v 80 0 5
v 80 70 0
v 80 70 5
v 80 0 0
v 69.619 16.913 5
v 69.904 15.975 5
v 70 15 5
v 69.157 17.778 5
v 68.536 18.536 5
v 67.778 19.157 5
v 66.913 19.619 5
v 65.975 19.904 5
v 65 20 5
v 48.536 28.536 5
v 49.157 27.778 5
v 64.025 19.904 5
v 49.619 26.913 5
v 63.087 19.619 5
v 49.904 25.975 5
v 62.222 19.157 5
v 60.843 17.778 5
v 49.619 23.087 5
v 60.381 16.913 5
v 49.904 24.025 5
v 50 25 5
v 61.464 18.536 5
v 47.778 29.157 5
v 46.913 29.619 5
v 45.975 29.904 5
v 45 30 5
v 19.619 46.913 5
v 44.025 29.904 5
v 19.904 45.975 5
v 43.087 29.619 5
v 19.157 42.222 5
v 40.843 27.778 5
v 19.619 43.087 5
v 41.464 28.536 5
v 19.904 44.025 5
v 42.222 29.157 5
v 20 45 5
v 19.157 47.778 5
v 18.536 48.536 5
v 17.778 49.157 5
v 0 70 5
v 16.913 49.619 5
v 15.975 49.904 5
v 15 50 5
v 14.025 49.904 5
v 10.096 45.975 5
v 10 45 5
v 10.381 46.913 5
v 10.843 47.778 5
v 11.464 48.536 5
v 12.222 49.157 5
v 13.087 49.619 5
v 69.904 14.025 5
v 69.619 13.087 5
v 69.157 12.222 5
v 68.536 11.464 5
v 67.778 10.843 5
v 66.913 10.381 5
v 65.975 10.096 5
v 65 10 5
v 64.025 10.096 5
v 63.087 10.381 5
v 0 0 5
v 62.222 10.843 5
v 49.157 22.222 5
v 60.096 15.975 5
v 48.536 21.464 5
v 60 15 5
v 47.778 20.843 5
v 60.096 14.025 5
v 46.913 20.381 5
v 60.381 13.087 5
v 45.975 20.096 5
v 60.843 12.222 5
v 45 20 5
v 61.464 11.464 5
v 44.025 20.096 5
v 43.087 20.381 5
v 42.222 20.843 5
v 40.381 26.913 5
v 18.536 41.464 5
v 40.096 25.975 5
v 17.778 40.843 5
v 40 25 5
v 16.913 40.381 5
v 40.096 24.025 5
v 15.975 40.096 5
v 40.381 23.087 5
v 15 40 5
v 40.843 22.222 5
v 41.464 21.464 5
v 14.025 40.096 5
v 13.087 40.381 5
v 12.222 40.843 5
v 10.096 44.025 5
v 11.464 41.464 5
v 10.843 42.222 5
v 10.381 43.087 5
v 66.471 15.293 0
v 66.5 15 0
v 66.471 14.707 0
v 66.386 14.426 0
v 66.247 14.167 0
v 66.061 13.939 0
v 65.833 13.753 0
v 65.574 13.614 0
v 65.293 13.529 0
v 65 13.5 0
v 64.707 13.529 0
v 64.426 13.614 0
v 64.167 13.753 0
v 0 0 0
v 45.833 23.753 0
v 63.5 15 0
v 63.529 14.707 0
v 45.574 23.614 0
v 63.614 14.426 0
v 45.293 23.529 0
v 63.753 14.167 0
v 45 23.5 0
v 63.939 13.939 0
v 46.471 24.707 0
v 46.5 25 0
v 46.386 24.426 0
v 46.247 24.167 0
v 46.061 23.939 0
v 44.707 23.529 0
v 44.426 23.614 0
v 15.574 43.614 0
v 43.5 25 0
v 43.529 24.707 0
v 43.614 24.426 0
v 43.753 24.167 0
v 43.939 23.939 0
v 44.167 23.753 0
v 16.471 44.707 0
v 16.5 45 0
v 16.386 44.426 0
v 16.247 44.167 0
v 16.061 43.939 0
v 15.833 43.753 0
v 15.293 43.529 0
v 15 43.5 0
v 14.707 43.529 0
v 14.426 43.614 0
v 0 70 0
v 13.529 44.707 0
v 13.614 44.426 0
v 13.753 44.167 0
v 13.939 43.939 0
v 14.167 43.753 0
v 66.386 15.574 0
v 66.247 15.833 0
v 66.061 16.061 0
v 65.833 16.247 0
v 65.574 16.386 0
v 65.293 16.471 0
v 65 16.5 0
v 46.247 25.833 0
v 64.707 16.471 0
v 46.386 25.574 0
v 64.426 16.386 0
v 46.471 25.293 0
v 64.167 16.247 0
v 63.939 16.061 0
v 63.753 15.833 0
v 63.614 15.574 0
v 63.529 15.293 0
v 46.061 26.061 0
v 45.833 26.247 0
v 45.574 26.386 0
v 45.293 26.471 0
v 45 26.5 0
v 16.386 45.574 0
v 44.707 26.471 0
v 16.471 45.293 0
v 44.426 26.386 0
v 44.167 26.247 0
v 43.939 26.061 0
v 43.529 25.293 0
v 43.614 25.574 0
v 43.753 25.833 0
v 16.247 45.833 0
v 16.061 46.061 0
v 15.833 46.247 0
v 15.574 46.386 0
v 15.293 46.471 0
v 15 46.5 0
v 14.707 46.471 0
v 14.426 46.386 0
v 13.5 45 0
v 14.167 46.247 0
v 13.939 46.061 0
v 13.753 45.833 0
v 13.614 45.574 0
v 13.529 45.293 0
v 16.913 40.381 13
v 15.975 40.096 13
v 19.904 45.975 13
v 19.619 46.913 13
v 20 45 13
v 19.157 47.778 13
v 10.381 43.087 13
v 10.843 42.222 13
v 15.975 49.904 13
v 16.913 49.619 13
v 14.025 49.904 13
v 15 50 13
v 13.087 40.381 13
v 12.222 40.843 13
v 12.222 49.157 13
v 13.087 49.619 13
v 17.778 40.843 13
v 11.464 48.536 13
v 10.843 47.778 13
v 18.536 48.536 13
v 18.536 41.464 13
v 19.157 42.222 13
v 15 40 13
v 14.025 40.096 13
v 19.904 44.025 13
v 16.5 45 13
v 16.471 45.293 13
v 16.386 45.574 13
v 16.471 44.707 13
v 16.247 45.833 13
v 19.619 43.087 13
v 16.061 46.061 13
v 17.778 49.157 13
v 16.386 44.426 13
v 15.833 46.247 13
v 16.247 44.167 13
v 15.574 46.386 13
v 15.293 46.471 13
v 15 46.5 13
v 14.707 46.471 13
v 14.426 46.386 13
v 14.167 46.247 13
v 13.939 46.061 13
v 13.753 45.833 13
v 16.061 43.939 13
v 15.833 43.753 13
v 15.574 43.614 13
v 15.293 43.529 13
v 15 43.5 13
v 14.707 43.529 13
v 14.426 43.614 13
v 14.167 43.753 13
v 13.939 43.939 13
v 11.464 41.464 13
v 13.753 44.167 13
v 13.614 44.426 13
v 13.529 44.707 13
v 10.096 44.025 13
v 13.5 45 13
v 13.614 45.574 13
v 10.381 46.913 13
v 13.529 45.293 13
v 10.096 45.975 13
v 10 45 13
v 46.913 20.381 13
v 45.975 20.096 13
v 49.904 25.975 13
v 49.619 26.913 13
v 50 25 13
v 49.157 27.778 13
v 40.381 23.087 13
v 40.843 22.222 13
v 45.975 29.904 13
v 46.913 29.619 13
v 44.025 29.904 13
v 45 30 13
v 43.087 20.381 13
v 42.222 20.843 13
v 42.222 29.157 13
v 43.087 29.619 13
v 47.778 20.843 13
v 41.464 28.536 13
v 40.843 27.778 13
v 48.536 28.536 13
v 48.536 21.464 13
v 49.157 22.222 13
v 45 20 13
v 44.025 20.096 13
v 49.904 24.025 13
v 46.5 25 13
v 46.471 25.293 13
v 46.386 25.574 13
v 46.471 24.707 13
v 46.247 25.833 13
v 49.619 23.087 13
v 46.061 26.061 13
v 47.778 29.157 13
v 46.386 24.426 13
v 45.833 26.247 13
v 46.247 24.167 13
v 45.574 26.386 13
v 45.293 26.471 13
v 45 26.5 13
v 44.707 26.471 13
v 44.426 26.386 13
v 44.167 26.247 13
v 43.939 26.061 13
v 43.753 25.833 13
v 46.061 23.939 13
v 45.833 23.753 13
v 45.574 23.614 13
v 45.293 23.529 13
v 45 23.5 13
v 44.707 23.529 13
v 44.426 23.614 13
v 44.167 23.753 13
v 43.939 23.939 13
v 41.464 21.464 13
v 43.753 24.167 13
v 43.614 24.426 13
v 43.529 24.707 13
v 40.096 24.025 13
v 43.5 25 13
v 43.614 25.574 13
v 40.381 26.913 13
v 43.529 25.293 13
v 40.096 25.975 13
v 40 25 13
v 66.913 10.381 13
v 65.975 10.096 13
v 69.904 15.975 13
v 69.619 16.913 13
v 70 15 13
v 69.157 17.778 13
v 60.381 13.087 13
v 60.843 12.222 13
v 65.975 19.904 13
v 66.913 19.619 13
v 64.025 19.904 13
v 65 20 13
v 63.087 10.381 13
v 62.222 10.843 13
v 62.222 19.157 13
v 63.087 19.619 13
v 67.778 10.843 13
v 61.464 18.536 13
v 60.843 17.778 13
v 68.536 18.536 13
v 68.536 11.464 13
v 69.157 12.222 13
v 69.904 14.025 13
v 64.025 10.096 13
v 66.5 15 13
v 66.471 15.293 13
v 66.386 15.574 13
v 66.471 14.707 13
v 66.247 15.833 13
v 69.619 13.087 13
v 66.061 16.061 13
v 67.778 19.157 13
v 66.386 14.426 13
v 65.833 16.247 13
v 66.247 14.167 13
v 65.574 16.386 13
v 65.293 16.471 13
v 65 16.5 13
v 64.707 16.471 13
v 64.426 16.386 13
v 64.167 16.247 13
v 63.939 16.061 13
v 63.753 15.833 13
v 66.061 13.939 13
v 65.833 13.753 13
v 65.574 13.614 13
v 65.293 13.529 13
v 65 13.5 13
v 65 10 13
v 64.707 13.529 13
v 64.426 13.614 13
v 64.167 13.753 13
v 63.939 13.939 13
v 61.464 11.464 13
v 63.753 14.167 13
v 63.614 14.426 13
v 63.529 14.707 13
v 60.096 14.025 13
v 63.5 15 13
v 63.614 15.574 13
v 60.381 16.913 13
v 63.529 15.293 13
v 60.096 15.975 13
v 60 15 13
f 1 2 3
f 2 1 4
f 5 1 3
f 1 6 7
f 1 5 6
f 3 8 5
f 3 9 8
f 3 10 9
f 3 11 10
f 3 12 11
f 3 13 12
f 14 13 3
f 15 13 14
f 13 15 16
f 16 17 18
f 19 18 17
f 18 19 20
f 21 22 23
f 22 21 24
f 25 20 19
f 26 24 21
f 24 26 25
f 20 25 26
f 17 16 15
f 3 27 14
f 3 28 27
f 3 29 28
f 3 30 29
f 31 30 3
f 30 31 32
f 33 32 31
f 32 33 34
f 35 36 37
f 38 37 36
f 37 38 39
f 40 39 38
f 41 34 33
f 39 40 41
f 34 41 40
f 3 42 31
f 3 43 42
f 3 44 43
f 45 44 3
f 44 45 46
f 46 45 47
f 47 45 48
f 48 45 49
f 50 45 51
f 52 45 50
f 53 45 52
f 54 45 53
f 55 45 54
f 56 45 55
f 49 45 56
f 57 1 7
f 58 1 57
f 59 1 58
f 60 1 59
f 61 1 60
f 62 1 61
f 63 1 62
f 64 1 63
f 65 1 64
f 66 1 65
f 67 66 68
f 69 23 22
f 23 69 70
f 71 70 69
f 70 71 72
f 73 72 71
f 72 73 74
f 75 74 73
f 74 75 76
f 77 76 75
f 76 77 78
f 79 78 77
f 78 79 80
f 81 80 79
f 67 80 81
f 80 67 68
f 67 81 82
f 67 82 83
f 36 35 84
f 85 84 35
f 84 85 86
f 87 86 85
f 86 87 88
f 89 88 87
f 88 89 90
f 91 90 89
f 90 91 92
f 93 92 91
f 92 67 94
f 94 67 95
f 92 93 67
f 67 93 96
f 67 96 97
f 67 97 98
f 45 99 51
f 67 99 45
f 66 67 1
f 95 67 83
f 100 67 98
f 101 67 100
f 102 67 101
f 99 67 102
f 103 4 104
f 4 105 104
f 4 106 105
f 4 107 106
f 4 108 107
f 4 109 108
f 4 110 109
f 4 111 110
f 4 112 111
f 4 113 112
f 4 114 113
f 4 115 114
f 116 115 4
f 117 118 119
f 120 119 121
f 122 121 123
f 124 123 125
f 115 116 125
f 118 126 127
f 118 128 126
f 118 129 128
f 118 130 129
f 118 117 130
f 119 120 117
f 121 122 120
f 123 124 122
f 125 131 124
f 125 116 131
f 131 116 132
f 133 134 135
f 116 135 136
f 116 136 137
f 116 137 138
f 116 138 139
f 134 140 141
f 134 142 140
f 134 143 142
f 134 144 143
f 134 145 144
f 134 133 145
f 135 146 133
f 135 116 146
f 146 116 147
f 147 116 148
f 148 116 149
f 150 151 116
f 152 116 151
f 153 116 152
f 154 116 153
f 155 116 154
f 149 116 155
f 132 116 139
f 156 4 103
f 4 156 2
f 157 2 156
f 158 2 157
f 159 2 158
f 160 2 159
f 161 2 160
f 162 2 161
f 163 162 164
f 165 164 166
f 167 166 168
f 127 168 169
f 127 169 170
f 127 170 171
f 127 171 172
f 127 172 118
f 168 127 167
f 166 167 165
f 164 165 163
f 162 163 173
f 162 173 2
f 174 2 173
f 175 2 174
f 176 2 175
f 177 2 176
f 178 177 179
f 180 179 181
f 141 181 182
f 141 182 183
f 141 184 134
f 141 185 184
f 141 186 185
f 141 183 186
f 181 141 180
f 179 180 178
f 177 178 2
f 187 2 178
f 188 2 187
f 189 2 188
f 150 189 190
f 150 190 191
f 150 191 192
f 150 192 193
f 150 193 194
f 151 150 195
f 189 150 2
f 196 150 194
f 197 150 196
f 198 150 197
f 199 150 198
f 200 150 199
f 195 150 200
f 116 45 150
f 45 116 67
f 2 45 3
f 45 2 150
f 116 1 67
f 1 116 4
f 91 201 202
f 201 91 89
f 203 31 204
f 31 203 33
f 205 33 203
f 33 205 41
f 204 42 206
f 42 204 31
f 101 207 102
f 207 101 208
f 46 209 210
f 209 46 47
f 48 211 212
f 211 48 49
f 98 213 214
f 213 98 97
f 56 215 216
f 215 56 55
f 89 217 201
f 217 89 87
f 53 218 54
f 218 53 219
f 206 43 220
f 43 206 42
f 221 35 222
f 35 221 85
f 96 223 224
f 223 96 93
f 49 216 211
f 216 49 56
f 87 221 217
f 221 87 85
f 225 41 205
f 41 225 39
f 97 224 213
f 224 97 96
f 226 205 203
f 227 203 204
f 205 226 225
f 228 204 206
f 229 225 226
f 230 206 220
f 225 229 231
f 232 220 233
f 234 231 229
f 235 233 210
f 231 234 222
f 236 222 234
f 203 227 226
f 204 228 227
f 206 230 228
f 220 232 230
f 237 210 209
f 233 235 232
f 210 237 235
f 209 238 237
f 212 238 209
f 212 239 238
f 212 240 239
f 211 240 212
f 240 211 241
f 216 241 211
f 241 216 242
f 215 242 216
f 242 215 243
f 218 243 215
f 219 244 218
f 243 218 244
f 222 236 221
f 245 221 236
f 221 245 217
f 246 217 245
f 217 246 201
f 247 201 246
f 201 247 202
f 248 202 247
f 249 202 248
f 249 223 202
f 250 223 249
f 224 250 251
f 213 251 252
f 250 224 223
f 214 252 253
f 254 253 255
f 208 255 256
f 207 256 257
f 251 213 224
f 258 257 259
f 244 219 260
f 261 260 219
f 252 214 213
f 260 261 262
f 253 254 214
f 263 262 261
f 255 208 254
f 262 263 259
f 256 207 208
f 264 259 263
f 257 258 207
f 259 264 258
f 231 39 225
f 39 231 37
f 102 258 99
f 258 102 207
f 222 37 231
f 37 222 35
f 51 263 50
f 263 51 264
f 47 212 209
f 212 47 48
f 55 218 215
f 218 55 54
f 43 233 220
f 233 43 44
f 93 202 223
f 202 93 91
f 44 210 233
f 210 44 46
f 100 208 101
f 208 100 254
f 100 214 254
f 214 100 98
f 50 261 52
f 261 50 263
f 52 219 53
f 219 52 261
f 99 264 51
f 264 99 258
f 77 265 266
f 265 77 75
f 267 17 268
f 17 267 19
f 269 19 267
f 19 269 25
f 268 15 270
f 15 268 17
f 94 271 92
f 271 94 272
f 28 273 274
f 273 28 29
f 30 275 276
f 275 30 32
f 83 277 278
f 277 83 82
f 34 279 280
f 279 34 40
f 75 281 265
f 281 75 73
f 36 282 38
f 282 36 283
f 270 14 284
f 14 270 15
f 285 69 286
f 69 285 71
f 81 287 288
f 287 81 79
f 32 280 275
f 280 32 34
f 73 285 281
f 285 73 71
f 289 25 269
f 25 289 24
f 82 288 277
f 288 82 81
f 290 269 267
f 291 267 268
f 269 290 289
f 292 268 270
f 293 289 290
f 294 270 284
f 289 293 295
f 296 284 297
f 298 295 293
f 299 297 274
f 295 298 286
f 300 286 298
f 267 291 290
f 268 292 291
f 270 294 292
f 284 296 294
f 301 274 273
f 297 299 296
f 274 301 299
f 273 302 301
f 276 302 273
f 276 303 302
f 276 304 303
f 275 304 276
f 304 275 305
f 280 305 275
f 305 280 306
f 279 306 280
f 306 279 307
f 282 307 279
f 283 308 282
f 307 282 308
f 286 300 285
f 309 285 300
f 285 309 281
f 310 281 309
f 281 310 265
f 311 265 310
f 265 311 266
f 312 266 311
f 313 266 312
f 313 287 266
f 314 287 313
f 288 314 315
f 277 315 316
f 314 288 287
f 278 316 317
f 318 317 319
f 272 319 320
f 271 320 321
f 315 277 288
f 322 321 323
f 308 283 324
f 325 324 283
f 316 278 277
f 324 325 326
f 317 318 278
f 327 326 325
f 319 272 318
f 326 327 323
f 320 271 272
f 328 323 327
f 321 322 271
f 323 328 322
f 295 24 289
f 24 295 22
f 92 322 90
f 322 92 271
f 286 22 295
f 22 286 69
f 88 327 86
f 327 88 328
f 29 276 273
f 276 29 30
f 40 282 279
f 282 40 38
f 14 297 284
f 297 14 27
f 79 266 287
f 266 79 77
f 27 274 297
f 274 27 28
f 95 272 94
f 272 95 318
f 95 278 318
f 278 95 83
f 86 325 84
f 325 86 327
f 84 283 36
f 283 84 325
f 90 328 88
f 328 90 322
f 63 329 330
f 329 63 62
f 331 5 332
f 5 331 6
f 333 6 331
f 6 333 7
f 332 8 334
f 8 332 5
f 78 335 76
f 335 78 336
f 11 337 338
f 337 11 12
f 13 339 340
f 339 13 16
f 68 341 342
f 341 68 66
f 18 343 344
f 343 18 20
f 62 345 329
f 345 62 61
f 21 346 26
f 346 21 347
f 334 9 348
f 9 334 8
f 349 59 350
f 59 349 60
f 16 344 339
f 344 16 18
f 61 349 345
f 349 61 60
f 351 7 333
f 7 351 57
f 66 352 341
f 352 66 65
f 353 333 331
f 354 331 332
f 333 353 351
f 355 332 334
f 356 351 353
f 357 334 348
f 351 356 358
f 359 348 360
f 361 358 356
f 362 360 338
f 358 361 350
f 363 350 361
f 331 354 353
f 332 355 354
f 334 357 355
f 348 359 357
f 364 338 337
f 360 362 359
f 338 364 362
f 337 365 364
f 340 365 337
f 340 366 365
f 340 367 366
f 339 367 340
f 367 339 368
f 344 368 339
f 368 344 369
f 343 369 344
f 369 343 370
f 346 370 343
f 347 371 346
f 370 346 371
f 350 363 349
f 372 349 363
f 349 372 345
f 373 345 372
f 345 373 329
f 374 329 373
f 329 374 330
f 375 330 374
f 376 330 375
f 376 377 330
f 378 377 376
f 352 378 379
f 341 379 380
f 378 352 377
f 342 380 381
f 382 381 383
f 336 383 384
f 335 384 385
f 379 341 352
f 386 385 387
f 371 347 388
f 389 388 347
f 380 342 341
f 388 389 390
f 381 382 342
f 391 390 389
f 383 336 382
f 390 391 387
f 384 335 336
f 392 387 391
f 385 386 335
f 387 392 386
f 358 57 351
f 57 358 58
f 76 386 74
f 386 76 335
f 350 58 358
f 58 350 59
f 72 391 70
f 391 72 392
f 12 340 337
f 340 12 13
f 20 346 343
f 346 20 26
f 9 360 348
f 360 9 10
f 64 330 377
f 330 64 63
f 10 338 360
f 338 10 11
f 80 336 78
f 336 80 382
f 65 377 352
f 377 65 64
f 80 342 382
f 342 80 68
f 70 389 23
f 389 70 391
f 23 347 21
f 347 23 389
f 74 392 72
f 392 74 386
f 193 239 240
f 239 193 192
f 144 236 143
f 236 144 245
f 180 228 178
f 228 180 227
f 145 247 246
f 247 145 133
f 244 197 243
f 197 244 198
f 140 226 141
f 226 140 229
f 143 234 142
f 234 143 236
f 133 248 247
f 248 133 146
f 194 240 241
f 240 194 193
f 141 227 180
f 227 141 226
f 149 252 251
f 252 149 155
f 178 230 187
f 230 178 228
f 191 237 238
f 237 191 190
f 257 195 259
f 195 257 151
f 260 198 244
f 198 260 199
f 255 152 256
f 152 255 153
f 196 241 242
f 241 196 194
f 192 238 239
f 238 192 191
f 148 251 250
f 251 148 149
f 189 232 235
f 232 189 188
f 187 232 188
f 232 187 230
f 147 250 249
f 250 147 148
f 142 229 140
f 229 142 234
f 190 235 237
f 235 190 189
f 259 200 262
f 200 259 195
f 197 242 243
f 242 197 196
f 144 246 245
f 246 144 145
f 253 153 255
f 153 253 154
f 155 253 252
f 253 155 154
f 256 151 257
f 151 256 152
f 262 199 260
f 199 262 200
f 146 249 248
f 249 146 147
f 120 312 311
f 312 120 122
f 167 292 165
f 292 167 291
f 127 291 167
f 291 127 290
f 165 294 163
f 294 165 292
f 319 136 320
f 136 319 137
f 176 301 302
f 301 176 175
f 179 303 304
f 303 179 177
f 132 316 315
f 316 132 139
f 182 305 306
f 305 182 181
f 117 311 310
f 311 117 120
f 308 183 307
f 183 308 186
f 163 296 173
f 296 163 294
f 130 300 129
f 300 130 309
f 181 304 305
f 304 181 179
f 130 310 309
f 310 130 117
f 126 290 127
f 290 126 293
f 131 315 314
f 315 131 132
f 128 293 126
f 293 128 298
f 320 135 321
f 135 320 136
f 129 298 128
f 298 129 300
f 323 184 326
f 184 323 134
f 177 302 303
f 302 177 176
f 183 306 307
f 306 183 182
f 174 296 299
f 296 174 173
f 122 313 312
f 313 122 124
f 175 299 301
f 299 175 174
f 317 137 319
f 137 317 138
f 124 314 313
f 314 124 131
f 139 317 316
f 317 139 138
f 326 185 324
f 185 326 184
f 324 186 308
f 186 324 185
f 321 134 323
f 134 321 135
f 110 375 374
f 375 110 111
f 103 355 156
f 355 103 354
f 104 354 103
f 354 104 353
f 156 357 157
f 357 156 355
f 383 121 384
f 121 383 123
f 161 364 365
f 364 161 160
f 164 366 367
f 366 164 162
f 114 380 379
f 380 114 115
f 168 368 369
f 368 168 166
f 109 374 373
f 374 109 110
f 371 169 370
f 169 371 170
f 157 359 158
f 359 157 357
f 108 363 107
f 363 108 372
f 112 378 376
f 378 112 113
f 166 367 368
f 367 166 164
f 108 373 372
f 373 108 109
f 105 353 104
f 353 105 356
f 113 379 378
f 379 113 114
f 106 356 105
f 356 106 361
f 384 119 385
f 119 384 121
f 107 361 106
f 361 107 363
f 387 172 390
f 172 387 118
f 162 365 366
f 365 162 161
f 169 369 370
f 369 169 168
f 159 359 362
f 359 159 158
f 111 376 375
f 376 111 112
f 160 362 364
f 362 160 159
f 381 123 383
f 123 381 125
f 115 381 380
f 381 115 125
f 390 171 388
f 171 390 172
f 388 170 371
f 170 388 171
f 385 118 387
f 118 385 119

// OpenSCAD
$fn = 32;

// ----------------------------------------------------------------------
// Boss field: plate with bosses at given coordinates
// ----------------------------------------------------------------------

// --- parameters (mm) ---
plate_l = 80;             // plate length, X
plate_w = 70;             // plate width, Y
plate_t = 5;              // plate thickness, Z
boss_d = 10;              // boss diameter
boss_h = 8;               // boss height above the plate
bore_d = 3;               // boss bore

total_h = plate_t + boss_h;  // overall height

difference() {
  union() {
    cube([plate_l, plate_w, plate_t]);
    translate([15, 45, plate_t]) cylinder(h = boss_h, d = boss_d);
    translate([45, 25, plate_t]) cylinder(h = boss_h, d = boss_d);
    translate([65, 15, plate_t]) cylinder(h = boss_h, d = boss_d);
  }
  translate([15, 45, -1]) cylinder(h = total_h + 2, d = bore_d);
  translate([45, 25, -1]) cylinder(h = total_h + 2, d = bore_d);
  translate([65, 15, -1]) cylinder(h = total_h + 2, d = bore_d);
}
